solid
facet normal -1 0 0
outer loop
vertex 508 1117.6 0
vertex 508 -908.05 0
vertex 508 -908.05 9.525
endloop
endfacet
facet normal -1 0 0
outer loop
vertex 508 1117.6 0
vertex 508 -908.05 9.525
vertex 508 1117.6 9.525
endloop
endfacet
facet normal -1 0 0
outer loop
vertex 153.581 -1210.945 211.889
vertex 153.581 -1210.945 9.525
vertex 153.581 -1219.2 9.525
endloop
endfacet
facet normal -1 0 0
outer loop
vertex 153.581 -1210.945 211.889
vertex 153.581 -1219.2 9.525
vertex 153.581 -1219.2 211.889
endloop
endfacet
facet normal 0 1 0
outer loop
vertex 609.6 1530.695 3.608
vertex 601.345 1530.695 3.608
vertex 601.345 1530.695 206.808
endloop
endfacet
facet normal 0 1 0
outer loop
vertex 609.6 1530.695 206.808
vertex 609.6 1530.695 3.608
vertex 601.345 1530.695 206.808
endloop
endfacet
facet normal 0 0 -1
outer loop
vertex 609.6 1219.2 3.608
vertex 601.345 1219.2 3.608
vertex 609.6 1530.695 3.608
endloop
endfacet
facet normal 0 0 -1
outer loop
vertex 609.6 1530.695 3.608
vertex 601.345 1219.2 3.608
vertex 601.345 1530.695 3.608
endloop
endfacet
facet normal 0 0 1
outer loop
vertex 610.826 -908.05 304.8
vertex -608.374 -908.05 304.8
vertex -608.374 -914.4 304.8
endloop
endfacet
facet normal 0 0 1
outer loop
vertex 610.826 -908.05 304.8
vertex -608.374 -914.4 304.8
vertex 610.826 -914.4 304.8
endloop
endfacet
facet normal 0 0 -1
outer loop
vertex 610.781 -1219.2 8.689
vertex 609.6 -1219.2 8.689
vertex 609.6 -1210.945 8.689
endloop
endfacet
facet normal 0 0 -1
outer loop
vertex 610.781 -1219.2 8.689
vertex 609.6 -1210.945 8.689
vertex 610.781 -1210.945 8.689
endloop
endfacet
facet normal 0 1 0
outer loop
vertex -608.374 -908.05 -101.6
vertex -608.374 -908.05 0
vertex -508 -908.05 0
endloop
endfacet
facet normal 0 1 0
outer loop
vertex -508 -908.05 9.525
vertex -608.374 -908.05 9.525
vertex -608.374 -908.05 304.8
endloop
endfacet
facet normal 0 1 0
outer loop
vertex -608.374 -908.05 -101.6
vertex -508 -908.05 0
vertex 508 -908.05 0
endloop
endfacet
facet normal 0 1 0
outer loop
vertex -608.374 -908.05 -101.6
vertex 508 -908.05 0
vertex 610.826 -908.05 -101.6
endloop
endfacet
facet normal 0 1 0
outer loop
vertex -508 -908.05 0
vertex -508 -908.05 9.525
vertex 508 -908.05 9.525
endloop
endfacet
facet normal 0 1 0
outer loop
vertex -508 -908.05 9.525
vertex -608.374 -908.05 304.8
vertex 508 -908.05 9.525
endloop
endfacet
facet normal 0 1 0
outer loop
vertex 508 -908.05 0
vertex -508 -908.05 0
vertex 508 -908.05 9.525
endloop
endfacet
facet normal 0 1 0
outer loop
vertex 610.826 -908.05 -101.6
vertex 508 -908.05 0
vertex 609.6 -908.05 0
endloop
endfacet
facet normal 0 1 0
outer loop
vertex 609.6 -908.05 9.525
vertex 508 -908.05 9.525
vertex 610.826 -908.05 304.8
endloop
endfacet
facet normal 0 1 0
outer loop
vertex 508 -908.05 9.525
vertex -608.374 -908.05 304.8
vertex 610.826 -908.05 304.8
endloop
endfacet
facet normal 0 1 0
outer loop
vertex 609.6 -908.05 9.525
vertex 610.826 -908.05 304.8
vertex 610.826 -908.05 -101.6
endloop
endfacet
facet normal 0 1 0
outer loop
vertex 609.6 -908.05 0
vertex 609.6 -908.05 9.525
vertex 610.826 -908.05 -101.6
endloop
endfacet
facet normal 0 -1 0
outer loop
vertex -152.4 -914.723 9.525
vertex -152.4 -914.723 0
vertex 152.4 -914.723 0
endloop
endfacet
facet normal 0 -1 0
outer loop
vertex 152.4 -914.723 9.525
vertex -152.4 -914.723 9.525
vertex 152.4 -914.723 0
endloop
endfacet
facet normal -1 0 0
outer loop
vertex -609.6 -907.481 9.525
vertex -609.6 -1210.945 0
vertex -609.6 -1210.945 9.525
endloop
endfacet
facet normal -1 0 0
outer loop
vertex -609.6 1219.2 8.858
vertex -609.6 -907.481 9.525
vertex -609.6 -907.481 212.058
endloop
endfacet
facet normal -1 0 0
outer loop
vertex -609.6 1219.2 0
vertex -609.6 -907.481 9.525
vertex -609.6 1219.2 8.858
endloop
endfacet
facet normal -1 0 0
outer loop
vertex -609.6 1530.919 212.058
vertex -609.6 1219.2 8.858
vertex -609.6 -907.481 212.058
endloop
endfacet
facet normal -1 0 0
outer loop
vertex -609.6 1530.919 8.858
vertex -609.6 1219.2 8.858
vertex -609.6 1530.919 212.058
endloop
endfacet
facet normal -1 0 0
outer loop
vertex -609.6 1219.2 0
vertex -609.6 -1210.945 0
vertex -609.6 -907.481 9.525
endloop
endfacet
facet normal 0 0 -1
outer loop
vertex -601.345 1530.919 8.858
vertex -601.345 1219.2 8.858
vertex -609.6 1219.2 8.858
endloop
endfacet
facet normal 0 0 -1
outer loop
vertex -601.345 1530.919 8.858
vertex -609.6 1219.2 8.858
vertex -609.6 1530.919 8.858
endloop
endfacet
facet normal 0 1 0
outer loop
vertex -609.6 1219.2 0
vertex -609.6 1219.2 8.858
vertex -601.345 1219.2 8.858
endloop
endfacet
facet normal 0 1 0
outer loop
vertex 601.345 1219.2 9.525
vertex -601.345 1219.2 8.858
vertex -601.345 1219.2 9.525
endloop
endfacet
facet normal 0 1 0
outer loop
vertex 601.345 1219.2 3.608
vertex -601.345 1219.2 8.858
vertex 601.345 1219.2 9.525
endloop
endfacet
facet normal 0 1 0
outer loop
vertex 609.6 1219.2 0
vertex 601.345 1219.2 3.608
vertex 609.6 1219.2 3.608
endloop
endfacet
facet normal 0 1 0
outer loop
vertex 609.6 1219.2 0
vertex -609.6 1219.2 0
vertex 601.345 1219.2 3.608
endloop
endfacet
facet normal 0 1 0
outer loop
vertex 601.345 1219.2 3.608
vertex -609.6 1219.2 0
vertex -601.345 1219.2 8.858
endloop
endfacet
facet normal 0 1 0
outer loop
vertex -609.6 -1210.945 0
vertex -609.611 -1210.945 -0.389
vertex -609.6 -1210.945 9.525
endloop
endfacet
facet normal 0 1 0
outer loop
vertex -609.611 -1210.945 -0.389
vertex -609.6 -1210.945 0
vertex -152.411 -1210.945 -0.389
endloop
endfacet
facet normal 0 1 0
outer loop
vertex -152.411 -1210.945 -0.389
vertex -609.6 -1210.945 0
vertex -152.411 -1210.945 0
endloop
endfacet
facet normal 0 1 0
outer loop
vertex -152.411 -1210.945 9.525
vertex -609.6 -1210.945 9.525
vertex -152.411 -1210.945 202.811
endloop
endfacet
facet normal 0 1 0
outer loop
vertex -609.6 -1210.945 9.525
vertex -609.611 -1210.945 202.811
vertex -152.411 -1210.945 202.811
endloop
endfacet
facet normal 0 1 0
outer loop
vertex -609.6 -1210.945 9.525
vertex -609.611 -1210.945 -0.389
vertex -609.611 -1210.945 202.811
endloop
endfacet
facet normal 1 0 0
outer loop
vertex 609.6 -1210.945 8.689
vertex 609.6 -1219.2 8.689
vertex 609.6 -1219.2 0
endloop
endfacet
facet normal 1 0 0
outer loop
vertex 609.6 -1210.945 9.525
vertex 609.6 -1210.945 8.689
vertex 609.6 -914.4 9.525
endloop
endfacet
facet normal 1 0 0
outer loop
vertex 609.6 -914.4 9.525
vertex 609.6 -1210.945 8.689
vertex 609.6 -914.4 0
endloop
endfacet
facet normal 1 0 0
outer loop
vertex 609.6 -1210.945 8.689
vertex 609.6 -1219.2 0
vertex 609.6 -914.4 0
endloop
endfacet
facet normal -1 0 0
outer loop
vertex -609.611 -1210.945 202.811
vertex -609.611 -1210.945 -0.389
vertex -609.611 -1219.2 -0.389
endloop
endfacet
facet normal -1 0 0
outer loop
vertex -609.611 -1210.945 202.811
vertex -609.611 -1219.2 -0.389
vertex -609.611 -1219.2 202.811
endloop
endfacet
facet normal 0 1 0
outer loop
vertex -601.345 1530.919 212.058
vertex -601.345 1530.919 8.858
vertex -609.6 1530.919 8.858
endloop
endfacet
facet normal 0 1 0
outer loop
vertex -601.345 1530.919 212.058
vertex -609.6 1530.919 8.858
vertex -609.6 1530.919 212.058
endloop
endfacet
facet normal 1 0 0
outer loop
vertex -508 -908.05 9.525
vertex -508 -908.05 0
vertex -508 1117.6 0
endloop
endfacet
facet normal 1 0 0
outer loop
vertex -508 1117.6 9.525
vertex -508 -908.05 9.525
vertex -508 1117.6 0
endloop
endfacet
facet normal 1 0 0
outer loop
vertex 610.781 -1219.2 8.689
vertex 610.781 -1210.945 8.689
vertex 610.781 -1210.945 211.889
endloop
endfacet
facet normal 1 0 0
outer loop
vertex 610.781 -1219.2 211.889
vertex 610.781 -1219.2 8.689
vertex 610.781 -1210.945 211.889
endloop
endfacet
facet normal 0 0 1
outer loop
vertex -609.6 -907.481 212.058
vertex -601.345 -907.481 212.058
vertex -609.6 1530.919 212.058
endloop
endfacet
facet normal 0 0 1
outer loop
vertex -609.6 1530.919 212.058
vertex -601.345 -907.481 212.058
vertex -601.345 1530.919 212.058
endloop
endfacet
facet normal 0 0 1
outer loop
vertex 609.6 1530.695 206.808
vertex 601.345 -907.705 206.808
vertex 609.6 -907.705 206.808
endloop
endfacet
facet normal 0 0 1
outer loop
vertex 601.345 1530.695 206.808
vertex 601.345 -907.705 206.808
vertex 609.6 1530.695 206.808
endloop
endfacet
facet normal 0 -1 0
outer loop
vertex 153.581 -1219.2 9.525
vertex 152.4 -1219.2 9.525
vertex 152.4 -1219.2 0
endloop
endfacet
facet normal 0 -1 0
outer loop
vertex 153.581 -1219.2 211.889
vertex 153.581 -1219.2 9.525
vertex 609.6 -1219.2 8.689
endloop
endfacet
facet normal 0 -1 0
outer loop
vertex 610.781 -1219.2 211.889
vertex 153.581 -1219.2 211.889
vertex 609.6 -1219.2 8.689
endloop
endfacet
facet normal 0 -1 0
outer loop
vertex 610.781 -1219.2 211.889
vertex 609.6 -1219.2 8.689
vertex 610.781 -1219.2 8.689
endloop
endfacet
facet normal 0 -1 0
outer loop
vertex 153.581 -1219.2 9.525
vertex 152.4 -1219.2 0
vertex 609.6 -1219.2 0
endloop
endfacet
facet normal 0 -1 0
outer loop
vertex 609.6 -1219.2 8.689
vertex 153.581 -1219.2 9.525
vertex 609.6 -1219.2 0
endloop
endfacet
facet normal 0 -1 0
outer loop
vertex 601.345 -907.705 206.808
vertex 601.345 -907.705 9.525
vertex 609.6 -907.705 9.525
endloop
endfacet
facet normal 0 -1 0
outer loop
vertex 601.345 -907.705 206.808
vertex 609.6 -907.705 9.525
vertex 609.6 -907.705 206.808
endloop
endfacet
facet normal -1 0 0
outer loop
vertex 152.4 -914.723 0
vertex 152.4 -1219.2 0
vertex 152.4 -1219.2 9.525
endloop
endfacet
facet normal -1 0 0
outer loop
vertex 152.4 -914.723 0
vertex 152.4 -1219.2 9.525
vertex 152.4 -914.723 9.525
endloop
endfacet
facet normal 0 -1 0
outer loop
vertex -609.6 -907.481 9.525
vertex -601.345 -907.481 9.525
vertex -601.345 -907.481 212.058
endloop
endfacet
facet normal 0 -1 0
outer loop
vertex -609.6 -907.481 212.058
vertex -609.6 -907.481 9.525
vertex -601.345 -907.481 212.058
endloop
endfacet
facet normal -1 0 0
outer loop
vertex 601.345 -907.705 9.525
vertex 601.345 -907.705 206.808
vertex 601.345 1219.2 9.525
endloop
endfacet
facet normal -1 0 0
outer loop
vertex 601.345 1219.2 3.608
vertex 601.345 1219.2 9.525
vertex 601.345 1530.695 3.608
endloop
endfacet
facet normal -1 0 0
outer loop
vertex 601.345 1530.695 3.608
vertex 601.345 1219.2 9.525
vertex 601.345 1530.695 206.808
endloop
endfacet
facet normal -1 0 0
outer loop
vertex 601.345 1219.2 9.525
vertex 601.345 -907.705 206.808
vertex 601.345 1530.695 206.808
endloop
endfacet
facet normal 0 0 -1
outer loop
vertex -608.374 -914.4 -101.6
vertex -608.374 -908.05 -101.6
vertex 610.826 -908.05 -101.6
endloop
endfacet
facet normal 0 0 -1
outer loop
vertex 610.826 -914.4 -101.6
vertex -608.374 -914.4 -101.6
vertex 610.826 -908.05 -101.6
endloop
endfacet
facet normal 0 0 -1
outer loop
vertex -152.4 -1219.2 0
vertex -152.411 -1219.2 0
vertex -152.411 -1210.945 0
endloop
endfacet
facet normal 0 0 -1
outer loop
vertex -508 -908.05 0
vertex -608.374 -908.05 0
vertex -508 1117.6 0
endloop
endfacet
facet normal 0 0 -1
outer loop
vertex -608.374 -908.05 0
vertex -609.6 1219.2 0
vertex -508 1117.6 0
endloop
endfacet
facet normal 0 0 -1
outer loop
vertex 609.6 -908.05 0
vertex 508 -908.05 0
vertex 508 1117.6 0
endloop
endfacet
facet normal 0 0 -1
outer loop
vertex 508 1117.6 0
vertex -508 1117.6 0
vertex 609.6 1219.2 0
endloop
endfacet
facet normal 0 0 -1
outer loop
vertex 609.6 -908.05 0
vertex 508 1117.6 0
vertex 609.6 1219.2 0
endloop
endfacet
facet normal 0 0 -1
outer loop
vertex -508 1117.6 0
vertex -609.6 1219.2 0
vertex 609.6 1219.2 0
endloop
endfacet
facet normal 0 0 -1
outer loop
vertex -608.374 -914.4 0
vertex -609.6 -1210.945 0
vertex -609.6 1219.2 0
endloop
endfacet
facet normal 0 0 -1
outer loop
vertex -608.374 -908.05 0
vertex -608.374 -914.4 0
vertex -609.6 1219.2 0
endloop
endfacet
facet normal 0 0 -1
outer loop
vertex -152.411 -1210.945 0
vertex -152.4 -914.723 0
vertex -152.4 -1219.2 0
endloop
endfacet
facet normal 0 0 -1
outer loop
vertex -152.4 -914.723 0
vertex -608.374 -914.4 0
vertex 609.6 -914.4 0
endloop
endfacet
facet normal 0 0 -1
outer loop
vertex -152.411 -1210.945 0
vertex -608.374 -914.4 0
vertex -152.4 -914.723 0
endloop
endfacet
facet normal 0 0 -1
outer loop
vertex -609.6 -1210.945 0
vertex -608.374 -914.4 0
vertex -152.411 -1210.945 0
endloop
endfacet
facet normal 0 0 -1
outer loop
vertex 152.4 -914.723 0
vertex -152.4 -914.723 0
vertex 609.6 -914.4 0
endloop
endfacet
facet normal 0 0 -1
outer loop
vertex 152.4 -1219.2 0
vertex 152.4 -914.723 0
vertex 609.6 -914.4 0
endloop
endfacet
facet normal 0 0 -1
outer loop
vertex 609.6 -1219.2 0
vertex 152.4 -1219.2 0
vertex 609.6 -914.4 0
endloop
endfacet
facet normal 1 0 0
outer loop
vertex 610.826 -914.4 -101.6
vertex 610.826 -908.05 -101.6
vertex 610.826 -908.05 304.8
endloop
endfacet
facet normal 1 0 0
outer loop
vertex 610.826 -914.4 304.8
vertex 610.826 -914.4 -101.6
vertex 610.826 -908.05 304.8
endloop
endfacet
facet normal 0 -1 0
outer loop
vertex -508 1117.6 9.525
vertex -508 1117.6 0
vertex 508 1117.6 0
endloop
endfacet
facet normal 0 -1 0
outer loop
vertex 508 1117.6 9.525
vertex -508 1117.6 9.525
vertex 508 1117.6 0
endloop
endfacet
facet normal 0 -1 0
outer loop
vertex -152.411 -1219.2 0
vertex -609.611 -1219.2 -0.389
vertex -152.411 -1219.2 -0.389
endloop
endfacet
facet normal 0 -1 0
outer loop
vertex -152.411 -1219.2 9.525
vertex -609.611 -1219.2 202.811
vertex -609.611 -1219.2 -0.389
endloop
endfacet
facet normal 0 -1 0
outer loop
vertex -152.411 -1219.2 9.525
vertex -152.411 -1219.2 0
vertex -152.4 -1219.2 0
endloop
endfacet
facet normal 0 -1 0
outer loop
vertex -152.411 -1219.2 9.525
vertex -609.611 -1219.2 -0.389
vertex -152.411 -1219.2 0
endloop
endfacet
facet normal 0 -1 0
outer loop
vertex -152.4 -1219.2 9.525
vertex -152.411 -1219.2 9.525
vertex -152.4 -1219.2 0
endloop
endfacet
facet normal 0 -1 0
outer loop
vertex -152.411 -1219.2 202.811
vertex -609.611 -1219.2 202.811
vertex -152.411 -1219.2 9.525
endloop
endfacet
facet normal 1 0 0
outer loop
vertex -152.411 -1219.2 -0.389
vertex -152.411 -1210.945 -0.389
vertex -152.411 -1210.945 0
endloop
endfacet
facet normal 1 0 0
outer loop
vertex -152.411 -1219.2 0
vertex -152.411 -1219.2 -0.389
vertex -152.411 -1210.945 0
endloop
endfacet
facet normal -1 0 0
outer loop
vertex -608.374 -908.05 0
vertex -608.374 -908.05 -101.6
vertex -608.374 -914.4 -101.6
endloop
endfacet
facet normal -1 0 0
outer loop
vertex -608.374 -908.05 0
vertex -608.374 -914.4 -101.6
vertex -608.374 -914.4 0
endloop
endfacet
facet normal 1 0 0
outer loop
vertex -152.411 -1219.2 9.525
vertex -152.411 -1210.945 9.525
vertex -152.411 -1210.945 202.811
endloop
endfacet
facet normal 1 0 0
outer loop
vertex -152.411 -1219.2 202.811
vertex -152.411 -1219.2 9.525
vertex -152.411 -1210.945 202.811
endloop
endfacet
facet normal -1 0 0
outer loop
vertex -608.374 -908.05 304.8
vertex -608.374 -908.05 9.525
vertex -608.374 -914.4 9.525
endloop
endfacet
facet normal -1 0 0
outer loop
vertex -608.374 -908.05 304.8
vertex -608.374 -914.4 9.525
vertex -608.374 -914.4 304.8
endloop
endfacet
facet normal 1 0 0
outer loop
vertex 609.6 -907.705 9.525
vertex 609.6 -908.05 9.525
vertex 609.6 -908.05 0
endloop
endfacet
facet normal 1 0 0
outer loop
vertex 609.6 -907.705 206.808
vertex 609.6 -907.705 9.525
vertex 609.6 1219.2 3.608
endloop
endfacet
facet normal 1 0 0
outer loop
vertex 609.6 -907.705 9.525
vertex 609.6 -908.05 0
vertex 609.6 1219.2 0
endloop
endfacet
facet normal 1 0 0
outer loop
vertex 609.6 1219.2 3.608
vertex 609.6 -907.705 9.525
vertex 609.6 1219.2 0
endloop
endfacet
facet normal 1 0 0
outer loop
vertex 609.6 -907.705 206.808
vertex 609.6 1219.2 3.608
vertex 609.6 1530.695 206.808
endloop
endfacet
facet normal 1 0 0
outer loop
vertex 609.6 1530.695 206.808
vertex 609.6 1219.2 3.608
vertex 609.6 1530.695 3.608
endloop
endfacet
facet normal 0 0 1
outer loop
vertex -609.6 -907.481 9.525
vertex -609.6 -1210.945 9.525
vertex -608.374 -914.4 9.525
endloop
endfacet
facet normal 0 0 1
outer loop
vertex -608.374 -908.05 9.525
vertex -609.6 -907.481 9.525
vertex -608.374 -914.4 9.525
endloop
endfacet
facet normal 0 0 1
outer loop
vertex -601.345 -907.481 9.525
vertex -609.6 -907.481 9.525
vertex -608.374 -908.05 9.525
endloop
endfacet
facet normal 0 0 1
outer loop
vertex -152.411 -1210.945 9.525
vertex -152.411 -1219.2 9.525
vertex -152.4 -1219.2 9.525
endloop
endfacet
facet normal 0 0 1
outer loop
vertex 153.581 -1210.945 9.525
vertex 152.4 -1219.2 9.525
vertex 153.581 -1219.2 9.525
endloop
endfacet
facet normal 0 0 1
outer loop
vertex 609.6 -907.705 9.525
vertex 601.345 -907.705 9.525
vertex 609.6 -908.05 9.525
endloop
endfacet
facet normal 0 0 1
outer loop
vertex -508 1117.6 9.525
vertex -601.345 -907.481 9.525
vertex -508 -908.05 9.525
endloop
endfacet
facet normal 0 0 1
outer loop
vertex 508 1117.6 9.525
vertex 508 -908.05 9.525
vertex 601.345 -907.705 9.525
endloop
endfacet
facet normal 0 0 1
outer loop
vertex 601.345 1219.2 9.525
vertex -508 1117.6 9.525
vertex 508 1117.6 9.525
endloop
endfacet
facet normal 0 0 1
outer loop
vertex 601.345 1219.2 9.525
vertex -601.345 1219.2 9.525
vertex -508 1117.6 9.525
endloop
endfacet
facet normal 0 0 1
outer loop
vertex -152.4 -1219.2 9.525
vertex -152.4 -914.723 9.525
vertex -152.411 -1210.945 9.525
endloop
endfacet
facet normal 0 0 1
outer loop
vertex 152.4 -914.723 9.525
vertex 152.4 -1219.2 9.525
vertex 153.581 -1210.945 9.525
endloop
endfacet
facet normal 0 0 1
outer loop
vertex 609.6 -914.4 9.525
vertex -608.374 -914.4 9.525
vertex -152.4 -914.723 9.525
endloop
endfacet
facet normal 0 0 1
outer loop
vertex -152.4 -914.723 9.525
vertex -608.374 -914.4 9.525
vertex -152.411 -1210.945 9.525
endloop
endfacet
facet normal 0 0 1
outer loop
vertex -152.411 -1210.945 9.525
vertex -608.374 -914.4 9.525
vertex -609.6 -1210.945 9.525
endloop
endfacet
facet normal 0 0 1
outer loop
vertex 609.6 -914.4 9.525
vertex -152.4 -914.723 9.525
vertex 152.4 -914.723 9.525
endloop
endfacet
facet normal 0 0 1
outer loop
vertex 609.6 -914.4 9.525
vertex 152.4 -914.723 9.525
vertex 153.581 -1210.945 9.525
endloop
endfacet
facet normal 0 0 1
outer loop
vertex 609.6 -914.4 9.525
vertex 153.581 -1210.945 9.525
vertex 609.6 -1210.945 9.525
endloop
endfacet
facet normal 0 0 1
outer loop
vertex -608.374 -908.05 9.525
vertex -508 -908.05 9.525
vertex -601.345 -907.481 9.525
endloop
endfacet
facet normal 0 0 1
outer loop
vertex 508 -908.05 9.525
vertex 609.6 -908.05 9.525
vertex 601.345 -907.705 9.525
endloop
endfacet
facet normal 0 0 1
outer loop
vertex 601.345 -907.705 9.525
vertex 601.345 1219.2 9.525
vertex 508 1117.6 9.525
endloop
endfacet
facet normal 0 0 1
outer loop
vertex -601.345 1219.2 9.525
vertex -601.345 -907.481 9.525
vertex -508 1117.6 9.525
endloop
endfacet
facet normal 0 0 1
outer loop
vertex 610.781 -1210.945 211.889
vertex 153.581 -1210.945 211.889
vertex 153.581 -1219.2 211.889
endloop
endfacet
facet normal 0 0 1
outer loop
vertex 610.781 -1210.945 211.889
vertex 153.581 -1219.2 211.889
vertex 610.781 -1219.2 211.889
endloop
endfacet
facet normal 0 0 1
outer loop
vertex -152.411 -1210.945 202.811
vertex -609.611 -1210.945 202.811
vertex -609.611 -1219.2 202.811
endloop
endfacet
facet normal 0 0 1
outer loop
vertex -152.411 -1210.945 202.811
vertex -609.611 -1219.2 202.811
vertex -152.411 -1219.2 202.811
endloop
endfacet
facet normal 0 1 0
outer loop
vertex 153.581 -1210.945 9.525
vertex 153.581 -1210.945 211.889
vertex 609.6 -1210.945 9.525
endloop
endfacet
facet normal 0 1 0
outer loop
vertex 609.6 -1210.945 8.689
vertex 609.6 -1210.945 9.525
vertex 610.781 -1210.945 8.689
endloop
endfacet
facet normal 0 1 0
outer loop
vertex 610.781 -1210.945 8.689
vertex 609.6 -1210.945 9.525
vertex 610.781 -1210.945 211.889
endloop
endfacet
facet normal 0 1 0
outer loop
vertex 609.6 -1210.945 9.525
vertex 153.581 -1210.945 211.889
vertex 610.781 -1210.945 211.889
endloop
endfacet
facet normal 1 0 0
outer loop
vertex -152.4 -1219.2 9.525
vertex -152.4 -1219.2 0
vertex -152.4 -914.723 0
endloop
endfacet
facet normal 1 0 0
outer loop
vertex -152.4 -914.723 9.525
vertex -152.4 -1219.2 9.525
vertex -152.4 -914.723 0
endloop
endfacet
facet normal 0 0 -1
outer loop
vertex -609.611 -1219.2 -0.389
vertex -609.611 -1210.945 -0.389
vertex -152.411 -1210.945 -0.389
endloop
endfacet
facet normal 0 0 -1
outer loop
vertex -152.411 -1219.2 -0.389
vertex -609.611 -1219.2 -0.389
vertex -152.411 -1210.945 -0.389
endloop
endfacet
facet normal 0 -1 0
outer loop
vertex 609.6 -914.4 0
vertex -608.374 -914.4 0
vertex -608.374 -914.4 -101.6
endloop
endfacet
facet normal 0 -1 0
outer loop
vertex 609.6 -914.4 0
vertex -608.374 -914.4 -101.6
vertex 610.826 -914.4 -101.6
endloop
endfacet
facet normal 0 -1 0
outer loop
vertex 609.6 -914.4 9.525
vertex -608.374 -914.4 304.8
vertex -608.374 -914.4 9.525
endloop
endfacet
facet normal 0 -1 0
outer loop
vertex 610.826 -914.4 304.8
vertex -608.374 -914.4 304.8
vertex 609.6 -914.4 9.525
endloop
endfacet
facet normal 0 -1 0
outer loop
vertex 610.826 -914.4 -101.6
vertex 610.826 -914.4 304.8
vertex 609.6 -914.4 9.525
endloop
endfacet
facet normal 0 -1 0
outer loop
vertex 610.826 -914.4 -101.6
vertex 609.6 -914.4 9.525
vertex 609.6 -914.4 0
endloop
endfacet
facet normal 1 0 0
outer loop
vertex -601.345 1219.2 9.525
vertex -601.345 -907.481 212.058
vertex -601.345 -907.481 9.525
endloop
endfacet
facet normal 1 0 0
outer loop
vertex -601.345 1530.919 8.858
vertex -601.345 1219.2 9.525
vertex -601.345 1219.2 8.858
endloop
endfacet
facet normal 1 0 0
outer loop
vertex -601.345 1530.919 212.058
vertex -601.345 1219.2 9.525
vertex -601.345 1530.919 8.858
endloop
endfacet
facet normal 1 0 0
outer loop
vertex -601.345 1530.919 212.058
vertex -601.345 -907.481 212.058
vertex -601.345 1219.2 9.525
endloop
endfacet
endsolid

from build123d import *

# Parameters (mm, degrees)
F0_W      = 1219.2
F0_H      = 2438.4
F0_W_2    = 1016
F0_H_2    = 2032
F1_DEPTH  = 9.525
F2_DEPTH  = 9.525
F4_START  = 908.05
F3_W      = 1219.2
F3_H      = 406.4
F4_DEPTH  = 6.35
F6_START  = 601.345
F5_W      = 2438.4
F5_H      = 203.2
F6_DEPTH  = 8.255
F8_START  = -601.345
F7_W      = 2438.4
F7_H      = 203.2
F8_DEPTH  = 8.255
F10_W     = 304.8
F10_H     = 304.8
F11_DEPTH = 43.18
F12_START = 1210.945
F9_W      = 457.2
F9_H      = 203.2
F12_DEPTH = 8.255
F14_START = 1210.945
F13_W     = 457.2
F13_H     = 203.2
F14_DEPTH = 8.255


# Not quite as in the source:
# - a feature names something its author has since deleted; it is built from what else it names


with BuildPart() as f1:
    # F0 (on Top) → F1 (new body)
    with BuildSketch(Plane.XY):
        Rectangle(F0_W, F0_H)
        with Locations((0, 101.6)):
            Rectangle(F0_W_2, F0_H_2, mode=Mode.SUBTRACT)
    extrude(amount=F1_DEPTH)

    # F0 (on Top) → F2 (cut)
    with BuildSketch(Plane.XY):
        Rectangle(F0_W, F0_H)
        with Locations((0, 101.6)):
            Rectangle(F0_W_2, F0_H_2, mode=Mode.SUBTRACT)
    extrude(amount=-F2_DEPTH, mode=Mode.SUBTRACT)

    # F3 (on Front) → F4 (join)
    with BuildSketch(Plane.XZ.offset(F4_START)):
        with Locations((1.2260880321, 101.6)):
            Rectangle(F3_W, F3_H)
    extrude(amount=F4_DEPTH)

    # F5 (on Right) → F6 (join)
    with BuildSketch(Plane.YZ.offset(F6_START)):
        with Locations((311.4953897893, 105.20761006)):
            Rectangle(F5_W, F5_H)
    extrude(amount=F6_DEPTH)

    # F7 (on Right) → F8 (join)
    with BuildSketch(Plane.YZ.offset(F8_START)):
        with Locations((311.7190003395, 110.4580410756)):
            Rectangle(F7_W, F7_H)
    extrude(amount=-F8_DEPTH)

    # F10 (on Top) → F11 (cut)
    with BuildSketch(Plane.XY):
        with Locations((0, -1067.1225335449)):
            Rectangle(F10_W, F10_H)
    extrude(amount=F11_DEPTH, mode=Mode.SUBTRACT)

    # F9 (on Front) → F12 (join)
    with BuildSketch(Plane.XZ.offset(F12_START)):
        with Locations((-381.010832265, 101.2114638133)):
            Rectangle(F9_W, F9_H)
    extrude(amount=F12_DEPTH)

    # F13 (on Front) → F14 (join)
    with BuildSketch(Plane.XZ.offset(F14_START)):
        with Locations((382.1813091636, 110.2889241311)):
            Rectangle(F13_W, F13_H)
    extrude(amount=F14_DEPTH)


solid = f1.part
